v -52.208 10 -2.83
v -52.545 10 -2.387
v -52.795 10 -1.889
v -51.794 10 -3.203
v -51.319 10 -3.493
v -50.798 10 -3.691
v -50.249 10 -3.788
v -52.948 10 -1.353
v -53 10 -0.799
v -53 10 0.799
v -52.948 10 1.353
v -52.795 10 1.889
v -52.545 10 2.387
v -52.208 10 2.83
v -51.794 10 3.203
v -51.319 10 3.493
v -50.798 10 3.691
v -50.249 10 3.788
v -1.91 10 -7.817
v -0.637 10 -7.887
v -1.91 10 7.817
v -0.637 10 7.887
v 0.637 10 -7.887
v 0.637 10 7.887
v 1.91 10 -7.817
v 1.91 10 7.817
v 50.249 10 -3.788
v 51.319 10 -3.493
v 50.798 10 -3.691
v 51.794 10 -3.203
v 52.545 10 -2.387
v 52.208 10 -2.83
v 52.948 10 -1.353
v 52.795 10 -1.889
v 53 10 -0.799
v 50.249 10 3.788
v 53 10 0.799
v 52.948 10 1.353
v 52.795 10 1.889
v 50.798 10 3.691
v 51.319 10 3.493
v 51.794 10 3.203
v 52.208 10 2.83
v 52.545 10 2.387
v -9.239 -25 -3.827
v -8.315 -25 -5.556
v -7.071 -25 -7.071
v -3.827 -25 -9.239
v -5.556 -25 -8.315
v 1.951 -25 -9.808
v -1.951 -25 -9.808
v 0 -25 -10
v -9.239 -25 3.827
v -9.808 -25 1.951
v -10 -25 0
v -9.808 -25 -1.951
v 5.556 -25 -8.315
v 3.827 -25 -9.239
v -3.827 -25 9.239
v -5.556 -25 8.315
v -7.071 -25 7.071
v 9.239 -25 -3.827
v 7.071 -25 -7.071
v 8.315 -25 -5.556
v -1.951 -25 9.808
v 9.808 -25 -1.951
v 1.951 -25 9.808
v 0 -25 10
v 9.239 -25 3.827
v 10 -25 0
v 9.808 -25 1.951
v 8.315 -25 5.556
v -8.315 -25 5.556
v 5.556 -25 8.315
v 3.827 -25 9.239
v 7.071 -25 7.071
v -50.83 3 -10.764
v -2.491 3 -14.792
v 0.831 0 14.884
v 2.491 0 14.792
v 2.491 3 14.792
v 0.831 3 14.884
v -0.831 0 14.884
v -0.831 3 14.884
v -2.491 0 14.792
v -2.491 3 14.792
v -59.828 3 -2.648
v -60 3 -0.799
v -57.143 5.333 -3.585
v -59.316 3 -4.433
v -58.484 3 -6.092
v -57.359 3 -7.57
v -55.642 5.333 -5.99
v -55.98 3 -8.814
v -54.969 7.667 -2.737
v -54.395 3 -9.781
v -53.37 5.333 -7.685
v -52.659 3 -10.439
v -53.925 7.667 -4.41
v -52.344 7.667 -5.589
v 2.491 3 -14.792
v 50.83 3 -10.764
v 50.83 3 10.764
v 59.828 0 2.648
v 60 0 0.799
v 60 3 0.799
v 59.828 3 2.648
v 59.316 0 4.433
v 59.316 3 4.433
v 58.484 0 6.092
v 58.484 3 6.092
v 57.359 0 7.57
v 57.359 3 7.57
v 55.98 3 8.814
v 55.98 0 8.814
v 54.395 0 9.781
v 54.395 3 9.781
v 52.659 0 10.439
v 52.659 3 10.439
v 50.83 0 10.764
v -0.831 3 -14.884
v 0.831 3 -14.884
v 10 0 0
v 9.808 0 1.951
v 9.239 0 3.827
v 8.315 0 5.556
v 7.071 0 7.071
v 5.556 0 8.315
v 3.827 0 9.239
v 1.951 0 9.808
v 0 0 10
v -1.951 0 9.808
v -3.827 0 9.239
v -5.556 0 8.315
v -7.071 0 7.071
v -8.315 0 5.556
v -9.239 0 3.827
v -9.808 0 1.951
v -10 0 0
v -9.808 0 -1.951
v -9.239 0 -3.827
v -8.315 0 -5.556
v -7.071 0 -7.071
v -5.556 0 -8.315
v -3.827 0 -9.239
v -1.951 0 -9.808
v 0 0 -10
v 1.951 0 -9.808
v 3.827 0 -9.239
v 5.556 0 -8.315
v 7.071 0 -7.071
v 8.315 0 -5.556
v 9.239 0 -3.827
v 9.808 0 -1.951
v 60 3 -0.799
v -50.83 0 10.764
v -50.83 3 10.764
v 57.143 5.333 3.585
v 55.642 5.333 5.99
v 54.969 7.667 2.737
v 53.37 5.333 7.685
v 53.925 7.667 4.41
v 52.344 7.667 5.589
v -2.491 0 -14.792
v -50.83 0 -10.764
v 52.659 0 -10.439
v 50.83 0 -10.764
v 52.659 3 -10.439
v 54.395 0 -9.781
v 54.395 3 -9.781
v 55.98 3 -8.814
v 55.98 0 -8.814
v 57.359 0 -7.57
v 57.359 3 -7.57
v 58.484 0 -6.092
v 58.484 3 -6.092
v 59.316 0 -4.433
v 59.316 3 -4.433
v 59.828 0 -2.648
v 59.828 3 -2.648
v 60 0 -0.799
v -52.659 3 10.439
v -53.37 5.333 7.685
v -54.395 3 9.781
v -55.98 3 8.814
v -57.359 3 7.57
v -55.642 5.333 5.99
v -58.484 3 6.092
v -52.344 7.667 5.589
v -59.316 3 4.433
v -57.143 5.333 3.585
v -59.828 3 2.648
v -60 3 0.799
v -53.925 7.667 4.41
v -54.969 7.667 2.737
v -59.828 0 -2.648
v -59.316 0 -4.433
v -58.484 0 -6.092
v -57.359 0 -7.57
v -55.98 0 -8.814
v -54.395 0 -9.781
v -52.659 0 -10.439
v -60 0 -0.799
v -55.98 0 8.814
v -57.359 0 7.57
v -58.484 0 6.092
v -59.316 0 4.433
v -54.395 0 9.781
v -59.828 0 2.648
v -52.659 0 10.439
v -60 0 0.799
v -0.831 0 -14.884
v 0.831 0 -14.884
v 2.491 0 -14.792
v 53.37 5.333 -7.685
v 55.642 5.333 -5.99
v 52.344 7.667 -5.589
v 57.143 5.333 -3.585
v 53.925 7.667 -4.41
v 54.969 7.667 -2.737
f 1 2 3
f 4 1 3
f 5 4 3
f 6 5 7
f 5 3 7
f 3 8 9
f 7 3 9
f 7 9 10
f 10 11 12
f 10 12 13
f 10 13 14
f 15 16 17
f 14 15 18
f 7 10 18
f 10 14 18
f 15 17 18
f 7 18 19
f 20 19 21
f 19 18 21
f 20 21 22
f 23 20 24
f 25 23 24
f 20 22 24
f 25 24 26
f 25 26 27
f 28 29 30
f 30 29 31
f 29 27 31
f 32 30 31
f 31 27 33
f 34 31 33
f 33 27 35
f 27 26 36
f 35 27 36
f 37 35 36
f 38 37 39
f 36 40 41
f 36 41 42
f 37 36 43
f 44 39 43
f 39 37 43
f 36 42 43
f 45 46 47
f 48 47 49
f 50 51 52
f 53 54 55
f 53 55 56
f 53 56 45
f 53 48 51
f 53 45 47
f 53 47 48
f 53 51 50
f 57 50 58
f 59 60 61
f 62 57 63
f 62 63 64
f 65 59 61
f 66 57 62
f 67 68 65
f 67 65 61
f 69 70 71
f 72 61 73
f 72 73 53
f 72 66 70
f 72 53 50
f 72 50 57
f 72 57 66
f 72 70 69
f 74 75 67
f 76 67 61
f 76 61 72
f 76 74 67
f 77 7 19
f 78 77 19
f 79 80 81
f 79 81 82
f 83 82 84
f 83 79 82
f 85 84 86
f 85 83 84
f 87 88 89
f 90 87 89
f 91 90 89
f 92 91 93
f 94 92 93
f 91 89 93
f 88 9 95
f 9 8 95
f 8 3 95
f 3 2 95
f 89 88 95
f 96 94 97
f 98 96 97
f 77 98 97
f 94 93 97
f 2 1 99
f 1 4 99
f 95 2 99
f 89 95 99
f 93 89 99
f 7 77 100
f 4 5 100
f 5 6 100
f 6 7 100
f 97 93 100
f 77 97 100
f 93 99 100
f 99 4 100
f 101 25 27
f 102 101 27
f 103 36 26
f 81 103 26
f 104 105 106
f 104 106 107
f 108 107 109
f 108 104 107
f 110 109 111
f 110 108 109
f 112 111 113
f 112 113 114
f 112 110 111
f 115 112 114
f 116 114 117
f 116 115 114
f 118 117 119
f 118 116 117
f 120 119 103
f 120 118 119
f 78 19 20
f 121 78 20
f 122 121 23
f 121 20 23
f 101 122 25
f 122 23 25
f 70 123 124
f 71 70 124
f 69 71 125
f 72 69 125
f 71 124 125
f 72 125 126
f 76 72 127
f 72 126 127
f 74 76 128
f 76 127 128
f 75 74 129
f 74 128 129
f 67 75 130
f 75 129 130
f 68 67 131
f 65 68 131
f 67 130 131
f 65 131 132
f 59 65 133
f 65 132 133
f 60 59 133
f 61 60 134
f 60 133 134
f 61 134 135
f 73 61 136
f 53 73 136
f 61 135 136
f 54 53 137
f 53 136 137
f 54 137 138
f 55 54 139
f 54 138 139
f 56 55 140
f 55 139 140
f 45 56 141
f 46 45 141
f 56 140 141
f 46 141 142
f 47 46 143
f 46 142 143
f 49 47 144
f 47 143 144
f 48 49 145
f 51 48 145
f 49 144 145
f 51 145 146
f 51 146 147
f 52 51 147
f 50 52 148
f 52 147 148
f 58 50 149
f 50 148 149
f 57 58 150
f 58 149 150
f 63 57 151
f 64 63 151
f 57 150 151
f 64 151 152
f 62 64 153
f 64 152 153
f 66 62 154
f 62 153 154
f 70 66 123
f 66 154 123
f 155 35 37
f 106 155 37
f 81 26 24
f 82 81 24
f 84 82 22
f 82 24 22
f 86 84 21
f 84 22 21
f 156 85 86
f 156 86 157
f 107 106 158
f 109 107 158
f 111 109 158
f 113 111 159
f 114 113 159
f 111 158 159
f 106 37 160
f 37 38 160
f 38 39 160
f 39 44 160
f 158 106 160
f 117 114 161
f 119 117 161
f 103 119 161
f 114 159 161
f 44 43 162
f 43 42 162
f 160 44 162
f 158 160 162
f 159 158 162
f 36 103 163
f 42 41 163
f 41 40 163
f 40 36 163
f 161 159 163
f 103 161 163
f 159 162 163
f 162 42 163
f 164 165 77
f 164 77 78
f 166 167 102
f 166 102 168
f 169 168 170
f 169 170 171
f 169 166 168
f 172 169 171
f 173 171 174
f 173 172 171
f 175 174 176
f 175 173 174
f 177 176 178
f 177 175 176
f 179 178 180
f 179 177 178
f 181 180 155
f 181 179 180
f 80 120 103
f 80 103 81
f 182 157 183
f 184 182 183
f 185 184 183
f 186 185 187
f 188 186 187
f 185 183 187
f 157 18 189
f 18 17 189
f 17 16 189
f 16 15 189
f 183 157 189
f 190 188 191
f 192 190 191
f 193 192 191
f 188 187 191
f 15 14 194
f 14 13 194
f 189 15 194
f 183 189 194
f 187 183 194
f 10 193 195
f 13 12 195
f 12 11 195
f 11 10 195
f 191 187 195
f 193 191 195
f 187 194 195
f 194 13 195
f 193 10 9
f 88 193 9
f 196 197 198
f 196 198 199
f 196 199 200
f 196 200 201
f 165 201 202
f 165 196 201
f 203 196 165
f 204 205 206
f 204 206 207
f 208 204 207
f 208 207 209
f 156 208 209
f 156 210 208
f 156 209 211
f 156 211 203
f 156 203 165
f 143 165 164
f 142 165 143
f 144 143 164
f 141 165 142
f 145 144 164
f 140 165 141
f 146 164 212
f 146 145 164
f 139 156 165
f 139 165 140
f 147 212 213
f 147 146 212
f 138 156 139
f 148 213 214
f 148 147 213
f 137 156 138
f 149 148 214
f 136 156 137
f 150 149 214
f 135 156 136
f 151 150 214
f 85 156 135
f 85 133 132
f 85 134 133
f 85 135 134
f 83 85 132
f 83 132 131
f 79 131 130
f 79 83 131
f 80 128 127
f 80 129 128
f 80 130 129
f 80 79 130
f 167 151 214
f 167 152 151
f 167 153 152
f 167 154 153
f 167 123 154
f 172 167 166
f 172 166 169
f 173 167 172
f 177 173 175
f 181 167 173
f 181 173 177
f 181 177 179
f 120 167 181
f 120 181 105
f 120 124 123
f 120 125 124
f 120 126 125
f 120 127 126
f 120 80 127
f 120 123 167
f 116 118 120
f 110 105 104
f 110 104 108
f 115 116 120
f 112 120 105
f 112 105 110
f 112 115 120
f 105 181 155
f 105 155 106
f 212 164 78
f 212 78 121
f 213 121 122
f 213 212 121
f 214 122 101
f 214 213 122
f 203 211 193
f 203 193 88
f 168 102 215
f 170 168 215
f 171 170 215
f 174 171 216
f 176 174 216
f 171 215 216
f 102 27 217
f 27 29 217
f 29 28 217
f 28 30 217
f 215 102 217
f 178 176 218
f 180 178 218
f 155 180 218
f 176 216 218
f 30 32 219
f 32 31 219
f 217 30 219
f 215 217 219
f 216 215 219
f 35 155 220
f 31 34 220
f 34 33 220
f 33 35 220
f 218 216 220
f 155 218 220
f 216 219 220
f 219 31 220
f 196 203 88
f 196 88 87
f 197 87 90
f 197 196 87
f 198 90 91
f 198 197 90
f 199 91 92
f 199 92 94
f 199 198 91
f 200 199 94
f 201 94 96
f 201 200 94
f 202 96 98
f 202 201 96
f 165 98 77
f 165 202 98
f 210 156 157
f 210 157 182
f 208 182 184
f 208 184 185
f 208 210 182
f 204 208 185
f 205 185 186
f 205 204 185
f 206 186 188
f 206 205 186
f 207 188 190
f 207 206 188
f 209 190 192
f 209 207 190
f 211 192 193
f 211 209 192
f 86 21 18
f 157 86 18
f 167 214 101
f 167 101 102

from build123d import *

# Parameters (mm, degrees)
F0_R     = 10
F1_DEPTH = 25
F3_DEPTH = 10
F4_SIZE  = 7


with BuildPart() as f1:
    # F0 (on Front) → F1 (new body)
    with BuildSketch(Plane.XZ):
        Circle(F0_R)
    extrude(amount=F1_DEPTH)

    # F2 (on Front) → F3 (join)
    with BuildSketch(Plane.XZ):
        with BuildLine():
            Line((-50.8304547985, -10.7641287668), (-2.4913643956, -14.7923863004))
            ThreePointArc((-2.4913643956, -14.7923863004), (0, -14.896013553), (2.4913643956, -14.7923863004))
            Line((2.4913643956, -14.7923863004), (50.8304547985, -10.7641287668))
            ThreePointArc((50.8304547985, -10.7641287668), (57.3588228673, -7.5697660742), (60, -0.7986711843))
            Line((60, -0.7986711843), (60, 0.7986711843))
            ThreePointArc((60, 0.7986711843), (57.3588228673, 7.5697660742), (50.8304547985, 10.7641287668))
            Line((50.8304547985, 10.7641287668), (2.4913643956, 14.7923863004))
            ThreePointArc((2.4913643956, 14.7923863004), (0, 14.896013553), (-2.4913643956, 14.7923863004))
            Line((-2.4913643956, 14.7923863004), (-50.8304547985, 10.7641287668))
            ThreePointArc((-50.8304547985, 10.7641287668), (-57.3588228673, 7.5697660742), (-60, 0.7986711843))
            Line((-60, 0.7986711843), (-60, -0.7986711843))
            ThreePointArc((-60, -0.7986711843), (-57.3588228673, -7.5697660742), (-50.8304547985, -10.7641287668))
        make_face()
    extrude(amount=-F3_DEPTH)

    # F4
    f4_edges = [f1.edges().sort_by_distance(p)[0] for p in [
        (-26.66091, 10, -12.778258),
        (0, 10, -14.896014),
        (26.66091, 10, -12.778258),
        (57.358823, 10, -7.569766),
        (60, 10, 0),
        (57.358823, 10, 7.569766),
        (26.66091, 10, 12.778258),
        (0, 10, 14.896014),
        (-26.66091, 10, 12.778258),
        (-57.358823, 10, 7.569766),
        (-60, 10, 0),
        (-57.358823, 10, -7.569766),
    ]]
    chamfer(f4_edges, length=F4_SIZE)


solid = f1.part
